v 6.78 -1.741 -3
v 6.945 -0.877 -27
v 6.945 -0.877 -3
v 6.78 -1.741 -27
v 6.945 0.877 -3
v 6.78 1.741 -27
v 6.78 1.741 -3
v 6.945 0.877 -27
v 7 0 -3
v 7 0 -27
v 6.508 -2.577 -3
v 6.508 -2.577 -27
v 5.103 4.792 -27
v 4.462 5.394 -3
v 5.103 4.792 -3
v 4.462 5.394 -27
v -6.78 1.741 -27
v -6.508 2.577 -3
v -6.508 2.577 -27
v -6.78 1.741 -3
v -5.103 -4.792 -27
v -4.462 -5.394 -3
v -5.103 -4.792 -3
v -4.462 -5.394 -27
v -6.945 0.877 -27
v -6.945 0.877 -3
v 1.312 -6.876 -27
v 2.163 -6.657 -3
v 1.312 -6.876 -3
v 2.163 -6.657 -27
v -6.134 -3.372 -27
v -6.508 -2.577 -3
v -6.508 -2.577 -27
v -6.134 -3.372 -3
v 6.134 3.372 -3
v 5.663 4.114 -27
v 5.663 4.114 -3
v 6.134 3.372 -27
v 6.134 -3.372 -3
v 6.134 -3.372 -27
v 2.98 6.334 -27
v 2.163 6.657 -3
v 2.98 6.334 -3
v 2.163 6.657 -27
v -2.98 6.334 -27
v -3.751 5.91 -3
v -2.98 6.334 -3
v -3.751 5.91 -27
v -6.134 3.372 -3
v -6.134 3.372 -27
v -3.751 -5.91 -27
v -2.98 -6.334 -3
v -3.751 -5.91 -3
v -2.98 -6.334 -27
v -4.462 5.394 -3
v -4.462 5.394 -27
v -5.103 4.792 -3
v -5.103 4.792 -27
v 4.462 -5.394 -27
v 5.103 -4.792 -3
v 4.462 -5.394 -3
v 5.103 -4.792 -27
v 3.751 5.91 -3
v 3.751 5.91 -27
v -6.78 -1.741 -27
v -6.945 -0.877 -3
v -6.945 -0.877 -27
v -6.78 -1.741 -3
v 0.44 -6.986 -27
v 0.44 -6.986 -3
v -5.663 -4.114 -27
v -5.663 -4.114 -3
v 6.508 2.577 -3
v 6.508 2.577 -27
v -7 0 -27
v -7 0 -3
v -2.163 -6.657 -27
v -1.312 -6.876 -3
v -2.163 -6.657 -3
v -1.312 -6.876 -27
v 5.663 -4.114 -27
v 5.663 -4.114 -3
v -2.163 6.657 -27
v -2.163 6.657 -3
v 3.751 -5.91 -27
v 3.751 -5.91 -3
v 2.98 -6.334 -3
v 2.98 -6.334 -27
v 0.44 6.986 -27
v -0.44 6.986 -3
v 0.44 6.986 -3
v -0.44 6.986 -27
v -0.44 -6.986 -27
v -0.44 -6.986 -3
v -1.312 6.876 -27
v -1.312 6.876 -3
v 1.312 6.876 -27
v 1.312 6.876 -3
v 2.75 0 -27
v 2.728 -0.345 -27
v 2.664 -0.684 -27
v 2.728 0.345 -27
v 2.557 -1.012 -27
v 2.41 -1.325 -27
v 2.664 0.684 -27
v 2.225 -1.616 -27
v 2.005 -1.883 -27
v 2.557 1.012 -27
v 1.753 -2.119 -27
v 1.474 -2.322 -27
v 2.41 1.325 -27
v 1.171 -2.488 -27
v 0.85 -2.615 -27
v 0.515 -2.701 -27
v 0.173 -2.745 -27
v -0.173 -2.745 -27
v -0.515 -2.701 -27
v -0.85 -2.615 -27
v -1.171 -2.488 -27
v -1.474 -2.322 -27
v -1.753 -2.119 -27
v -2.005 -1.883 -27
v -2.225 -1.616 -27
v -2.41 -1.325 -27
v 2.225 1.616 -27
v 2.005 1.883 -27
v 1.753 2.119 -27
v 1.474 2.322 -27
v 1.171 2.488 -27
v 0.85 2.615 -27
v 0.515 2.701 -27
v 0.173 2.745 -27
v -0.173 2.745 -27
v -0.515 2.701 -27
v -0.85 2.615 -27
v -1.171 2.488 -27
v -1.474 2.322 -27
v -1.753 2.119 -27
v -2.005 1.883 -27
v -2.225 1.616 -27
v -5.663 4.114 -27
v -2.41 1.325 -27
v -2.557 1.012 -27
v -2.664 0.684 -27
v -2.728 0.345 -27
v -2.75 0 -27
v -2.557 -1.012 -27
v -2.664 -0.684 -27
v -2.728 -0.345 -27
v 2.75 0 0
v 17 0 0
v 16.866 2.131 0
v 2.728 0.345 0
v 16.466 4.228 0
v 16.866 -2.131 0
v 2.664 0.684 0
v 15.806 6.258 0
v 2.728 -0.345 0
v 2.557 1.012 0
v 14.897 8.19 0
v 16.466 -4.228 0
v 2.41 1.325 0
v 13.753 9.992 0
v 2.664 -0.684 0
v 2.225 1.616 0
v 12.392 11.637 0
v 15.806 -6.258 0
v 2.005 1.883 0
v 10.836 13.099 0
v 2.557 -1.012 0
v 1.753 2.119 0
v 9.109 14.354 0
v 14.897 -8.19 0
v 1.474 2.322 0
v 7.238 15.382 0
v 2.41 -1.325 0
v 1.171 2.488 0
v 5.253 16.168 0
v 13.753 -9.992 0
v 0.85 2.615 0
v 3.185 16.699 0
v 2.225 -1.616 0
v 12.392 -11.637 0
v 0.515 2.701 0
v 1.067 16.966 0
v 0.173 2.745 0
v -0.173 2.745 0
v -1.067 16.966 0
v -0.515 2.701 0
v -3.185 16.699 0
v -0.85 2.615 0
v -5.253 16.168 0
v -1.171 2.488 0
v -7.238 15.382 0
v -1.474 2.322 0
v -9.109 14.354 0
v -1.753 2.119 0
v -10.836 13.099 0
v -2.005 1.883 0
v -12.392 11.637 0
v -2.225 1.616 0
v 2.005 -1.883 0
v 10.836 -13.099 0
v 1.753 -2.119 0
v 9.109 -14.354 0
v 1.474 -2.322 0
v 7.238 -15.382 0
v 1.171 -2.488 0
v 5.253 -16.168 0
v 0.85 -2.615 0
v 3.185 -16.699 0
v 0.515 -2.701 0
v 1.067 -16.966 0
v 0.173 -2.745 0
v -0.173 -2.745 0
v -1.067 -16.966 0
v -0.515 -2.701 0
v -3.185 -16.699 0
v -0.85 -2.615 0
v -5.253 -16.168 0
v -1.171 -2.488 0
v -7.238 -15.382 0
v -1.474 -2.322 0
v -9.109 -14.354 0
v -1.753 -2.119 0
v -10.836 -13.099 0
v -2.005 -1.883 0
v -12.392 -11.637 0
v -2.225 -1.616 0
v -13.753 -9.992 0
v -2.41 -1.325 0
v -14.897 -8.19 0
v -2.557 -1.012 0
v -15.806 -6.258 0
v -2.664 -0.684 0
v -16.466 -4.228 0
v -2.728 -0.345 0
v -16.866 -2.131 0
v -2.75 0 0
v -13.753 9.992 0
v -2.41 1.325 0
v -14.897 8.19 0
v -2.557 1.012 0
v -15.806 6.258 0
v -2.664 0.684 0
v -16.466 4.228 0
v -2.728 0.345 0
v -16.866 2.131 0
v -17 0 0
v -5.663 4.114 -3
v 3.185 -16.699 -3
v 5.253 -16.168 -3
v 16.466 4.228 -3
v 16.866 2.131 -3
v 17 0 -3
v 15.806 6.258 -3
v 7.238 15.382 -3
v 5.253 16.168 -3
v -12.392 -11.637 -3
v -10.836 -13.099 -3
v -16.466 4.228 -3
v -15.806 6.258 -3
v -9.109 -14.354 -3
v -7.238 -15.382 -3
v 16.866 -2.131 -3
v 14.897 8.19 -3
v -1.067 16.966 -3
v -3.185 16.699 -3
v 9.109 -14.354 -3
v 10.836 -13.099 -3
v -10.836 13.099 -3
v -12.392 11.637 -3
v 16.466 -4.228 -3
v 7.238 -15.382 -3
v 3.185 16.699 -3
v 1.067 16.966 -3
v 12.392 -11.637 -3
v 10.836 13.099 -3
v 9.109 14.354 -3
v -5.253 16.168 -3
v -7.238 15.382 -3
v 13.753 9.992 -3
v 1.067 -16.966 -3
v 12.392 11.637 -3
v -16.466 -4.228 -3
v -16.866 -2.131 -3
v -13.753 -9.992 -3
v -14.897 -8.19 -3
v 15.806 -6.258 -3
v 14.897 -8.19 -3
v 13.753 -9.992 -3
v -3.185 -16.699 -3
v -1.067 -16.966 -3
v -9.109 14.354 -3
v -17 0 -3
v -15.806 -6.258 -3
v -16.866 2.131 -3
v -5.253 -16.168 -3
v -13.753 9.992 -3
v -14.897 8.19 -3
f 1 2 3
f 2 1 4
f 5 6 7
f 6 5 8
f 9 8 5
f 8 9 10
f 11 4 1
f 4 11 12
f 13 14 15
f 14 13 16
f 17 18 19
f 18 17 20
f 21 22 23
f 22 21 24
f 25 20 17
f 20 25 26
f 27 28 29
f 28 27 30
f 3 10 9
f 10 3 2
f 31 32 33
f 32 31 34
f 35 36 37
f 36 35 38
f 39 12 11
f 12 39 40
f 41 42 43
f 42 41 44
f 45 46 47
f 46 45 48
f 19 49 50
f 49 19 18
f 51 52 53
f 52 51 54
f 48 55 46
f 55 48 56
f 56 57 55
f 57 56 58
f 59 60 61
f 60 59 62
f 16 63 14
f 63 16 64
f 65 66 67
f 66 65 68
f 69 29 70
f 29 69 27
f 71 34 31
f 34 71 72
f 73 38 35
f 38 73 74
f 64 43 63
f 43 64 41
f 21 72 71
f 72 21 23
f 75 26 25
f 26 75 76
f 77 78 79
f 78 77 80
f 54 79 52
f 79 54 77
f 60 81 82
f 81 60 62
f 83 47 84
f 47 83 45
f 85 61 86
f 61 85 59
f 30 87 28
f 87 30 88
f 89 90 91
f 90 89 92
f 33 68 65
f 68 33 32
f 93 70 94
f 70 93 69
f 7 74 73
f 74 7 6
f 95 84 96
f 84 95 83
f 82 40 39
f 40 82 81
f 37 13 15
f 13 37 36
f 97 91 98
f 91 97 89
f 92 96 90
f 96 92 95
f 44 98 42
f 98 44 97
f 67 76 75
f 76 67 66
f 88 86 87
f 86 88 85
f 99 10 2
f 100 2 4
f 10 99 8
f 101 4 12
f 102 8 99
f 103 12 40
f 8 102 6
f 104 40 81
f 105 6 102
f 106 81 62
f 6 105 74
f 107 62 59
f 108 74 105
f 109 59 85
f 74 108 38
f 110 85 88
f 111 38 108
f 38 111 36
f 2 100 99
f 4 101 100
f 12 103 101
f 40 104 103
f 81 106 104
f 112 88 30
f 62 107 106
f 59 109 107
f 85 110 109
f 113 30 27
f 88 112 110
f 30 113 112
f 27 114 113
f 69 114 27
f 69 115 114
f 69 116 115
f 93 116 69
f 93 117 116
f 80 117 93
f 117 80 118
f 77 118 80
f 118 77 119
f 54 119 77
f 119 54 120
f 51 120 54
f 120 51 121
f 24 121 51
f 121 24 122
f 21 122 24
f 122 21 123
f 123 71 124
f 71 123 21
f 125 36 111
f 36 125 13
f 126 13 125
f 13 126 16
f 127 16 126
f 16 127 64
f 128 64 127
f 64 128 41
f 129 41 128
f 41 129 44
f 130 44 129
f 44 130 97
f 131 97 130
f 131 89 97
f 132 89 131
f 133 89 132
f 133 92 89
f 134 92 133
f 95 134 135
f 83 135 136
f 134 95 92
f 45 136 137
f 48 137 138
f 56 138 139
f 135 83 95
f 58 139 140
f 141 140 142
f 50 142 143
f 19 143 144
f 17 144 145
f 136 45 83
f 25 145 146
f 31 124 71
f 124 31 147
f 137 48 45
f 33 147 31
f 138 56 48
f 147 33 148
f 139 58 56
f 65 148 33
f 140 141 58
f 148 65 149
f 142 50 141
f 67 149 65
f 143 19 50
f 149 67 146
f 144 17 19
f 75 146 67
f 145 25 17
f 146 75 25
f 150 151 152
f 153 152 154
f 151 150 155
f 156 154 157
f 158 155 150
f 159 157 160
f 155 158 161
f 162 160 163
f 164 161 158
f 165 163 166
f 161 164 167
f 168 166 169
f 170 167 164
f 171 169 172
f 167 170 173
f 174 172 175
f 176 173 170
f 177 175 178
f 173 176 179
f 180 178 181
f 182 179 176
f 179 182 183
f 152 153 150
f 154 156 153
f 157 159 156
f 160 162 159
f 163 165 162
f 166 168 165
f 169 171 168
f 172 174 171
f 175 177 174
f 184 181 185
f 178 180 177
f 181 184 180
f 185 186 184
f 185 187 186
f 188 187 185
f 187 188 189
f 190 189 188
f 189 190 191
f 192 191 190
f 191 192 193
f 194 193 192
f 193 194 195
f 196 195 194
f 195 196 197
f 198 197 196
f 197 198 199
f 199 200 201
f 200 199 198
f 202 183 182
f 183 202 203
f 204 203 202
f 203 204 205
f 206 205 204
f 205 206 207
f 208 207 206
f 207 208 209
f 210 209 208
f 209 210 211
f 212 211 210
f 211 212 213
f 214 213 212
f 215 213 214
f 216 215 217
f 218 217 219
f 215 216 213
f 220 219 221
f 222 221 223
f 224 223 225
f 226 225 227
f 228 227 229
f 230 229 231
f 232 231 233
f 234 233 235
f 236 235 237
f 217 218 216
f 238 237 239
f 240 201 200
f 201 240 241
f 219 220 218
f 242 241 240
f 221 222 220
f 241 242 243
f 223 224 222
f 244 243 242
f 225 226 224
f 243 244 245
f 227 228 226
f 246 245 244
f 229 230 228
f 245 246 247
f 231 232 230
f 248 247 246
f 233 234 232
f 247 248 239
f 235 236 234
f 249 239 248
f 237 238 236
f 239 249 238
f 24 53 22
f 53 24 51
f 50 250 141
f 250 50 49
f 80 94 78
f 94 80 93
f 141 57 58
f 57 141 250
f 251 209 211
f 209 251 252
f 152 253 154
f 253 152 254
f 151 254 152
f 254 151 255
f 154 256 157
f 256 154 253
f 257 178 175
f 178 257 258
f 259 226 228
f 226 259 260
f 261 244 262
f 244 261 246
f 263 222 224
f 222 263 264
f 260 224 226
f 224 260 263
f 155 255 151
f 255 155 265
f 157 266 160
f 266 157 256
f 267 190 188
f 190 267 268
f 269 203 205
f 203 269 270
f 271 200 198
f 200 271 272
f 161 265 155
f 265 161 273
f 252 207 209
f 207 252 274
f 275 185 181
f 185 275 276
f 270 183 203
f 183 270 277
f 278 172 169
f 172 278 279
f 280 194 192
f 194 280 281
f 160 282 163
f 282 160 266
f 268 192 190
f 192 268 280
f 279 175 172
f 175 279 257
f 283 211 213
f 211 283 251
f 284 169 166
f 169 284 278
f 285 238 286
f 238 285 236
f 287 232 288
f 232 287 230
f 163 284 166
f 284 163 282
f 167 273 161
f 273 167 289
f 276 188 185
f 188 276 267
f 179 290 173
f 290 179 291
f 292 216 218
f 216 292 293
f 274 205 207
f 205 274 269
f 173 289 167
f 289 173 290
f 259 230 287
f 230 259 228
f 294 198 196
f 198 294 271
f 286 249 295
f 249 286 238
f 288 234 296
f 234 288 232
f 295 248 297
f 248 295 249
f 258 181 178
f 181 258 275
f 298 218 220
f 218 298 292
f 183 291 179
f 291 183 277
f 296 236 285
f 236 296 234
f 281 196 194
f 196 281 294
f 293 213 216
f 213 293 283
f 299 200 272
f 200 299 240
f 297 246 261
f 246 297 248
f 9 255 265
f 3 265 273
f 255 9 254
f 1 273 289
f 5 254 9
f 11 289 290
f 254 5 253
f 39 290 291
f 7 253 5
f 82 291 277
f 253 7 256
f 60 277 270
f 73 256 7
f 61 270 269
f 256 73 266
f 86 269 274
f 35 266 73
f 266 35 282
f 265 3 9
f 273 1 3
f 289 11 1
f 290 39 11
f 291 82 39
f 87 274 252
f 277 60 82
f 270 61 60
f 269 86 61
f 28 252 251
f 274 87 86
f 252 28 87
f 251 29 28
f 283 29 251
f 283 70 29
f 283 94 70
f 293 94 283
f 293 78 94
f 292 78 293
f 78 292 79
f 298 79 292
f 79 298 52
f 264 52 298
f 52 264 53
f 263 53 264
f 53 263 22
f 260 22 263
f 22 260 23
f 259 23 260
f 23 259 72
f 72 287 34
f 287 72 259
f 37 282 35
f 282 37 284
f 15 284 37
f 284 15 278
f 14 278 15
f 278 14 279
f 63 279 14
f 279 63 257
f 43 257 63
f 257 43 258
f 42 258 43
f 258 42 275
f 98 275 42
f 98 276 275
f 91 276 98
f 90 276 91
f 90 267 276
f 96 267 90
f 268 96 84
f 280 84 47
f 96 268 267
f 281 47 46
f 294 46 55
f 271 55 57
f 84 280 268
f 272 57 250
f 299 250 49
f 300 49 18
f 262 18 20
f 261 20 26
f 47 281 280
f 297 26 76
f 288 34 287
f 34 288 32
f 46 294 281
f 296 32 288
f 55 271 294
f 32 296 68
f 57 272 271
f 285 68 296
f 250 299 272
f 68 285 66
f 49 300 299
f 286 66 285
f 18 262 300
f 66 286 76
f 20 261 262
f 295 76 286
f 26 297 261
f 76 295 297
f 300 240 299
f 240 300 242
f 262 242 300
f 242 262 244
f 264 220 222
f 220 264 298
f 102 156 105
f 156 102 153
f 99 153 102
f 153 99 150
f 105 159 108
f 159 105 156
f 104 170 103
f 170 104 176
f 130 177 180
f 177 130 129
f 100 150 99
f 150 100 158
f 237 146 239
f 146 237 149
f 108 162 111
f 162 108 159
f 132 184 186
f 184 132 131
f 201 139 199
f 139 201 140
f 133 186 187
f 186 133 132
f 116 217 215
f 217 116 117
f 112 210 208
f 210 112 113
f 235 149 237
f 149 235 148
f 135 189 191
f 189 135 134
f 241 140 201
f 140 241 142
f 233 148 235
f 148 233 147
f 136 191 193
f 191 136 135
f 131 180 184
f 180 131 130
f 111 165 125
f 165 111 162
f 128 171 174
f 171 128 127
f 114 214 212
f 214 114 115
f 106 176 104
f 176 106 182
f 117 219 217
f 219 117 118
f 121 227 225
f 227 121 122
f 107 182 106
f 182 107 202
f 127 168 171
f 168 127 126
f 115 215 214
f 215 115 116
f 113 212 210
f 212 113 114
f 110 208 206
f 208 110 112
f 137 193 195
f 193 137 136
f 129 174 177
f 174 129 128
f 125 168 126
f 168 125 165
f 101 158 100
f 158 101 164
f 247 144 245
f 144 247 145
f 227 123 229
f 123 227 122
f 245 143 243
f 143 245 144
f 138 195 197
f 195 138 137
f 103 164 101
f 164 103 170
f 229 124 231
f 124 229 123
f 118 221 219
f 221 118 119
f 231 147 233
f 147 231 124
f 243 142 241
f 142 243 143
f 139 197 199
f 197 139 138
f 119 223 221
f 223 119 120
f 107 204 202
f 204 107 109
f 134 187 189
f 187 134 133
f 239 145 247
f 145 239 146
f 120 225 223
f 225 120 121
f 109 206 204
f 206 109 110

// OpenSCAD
$fn = 50;


difference() {
	union() {
		translate(v = [0, 0, -27.0000000000]) {
			cylinder(h = 27, r = 7.0000000000);
		}
		translate(v = [0, 0, -3.0000000000]) {
			cylinder(h = 3, r = 17.0000000000);
		}
	}
	union() {
		#translate(v = [0, 0, -27]) {
			cylinder(h = 27, r = 2.7500000000);
		}
	}
}
